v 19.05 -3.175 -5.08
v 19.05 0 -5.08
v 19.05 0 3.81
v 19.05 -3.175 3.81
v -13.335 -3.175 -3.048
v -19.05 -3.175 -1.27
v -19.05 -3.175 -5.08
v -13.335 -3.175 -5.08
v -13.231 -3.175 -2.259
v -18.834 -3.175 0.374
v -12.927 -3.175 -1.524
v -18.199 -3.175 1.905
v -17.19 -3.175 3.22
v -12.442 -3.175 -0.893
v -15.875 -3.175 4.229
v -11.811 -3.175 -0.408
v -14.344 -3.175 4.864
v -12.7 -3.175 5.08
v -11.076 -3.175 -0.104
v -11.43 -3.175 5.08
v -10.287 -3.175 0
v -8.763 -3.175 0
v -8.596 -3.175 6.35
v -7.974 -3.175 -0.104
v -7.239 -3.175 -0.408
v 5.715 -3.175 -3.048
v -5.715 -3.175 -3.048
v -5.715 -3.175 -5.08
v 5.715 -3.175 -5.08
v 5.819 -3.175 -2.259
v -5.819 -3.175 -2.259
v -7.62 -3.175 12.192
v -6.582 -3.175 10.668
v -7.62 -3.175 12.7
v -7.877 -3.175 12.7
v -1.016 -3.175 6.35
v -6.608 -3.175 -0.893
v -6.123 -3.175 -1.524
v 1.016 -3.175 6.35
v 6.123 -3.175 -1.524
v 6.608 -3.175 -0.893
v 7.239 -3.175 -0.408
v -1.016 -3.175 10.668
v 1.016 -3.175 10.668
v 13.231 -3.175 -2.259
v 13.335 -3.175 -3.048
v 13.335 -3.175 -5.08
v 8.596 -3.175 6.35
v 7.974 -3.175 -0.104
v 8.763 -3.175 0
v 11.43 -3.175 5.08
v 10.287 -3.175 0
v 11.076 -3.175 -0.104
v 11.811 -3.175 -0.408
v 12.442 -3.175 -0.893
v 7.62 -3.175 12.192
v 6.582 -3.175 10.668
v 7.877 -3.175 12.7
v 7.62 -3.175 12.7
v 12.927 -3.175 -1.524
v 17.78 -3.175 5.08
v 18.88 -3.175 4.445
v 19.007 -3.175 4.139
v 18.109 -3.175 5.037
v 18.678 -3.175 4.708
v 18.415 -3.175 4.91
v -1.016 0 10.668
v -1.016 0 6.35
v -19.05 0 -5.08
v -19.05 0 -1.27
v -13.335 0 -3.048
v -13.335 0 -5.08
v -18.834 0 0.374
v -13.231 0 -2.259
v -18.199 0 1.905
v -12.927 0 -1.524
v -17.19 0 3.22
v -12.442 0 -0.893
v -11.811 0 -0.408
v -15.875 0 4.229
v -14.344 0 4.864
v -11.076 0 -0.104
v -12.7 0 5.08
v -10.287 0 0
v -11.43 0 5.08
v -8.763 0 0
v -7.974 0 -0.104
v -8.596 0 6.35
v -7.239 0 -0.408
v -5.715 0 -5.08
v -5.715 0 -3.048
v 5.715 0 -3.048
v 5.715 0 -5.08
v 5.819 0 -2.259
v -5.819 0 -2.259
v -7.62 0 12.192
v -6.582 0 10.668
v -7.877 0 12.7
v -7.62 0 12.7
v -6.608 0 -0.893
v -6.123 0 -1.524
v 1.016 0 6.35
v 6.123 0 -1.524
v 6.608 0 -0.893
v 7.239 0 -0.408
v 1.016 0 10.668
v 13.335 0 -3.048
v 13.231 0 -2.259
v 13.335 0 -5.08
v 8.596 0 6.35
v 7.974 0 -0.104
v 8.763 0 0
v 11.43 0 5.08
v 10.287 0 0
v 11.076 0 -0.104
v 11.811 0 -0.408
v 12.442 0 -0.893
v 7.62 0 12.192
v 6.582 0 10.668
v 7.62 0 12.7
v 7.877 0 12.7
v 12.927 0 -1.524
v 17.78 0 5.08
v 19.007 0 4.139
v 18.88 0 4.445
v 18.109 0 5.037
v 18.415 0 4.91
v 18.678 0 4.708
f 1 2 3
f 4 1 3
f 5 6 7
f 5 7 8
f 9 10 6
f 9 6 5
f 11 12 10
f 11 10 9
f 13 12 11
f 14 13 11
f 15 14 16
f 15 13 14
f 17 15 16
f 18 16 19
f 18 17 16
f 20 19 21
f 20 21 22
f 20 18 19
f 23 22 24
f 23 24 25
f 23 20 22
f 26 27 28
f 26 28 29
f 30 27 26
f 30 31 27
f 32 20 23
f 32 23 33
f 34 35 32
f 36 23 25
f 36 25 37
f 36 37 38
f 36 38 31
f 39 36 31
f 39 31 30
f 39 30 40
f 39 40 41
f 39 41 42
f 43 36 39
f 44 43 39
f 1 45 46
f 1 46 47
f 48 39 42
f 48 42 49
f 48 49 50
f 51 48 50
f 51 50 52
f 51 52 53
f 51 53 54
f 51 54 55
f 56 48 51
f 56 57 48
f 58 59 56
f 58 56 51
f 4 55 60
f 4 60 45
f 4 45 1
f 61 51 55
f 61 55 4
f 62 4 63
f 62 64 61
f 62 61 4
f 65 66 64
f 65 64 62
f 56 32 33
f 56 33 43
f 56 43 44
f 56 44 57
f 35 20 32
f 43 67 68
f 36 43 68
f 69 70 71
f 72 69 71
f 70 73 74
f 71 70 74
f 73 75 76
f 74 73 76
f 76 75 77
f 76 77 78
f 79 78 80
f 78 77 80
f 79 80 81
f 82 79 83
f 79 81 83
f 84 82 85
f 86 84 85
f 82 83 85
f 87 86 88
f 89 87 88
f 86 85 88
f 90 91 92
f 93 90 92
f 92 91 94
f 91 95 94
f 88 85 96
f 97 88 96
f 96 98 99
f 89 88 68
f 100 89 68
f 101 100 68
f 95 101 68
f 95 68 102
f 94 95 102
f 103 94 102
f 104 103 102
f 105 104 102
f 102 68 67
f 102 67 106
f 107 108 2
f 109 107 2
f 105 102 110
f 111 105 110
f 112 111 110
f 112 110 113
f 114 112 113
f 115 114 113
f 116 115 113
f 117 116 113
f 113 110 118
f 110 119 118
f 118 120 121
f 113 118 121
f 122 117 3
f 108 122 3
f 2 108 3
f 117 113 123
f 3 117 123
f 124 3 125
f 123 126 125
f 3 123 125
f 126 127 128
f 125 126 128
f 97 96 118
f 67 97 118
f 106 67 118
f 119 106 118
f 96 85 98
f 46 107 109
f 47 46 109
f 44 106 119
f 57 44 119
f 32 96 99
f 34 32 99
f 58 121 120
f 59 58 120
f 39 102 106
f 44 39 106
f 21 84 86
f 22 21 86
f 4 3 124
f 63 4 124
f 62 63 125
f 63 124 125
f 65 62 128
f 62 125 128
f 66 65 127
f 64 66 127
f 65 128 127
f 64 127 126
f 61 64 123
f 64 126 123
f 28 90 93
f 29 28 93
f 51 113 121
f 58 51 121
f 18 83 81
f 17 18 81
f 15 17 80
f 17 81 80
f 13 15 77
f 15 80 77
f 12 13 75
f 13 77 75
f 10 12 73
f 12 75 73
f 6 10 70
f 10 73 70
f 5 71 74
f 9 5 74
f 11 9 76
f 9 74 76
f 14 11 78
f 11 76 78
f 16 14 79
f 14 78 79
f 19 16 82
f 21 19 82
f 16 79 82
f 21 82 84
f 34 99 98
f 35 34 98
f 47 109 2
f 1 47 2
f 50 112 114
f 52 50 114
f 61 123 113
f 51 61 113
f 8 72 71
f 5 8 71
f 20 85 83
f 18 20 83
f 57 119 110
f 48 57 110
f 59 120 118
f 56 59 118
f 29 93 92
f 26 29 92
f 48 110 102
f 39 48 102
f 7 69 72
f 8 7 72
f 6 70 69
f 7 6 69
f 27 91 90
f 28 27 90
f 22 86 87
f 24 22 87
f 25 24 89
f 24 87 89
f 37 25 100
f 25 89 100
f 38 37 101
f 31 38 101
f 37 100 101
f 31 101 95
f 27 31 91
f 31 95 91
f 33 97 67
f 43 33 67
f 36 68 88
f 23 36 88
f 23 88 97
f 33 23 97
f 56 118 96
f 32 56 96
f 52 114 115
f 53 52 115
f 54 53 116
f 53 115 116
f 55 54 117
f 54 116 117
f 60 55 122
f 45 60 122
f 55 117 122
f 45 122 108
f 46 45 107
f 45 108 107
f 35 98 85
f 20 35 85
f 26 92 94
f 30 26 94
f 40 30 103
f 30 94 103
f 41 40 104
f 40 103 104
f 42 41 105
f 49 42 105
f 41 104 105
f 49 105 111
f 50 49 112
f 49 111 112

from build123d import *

# Parameters (mm, degrees)
F1_DEPTH = 3.175


with BuildPart() as f1:
    # F0 (on Front) → F1 (new body)
    with BuildSketch(Plane.XZ):
        with BuildLine():
            ThreePointArc((19.05, 3.81), (18.6780256121, 4.7080256121), (17.78, 5.08))
            Line((17.78, 5.08), (11.43, 5.08))
            Line((11.43, 5.08), (-11.43, 5.08))
            Line((-11.43, 5.08), (-12.7, 5.08))
            ThreePointArc((-12.7, 5.08), (-17.1901280605, 3.2201280605), (-19.05, -1.27))
            Line((-19.05, -1.27), (-19.05, -5.08))
            Line((-19.05, -5.08), (-13.335, -5.08))
            Line((-13.335, -5.08), (-13.335, -3.048))
            ThreePointArc((-13.335, -3.048), (-12.4422614691, -0.8927385309), (-10.287, 0))
            Line((-10.287, 0), (-8.763, 0))
            ThreePointArc((-8.763, 0), (-6.6077385309, -0.8927385309), (-5.715, -3.048))
            Line((-5.715, -3.048), (-5.715, -5.08))
            Line((-5.715, -5.08), (5.715, -5.08))
            Line((5.715, -5.08), (5.715, -3.048))
            ThreePointArc((5.715, -3.048), (6.6077385309, -0.8927385309), (8.763, 0))
            Line((8.763, 0), (10.287, 0))
            ThreePointArc((10.287, 0), (12.4422614691, -0.8927385309), (13.335, -3.048))
            Line((13.335, -3.048), (13.335, -5.08))
            Line((13.335, -5.08), (19.05, -5.08))
            Line((19.05, -5.08), (19.05, 3.81))
        make_face()
        Polygon((-11.43, 5.08), (11.43, 5.08), (7.8767356449, 12.7), (7.62, 12.7), (7.62, 12.192), (0, 12.192), (-7.62, 12.192), (-7.62, 12.7), (-7.8767356449, 12.7), align=None)
        Polygon((-1.016, 6.35), (-8.5957253428, 6.35), (-6.5822088749, 10.668), (-1.016, 10.668), align=None, mode=Mode.SUBTRACT)
        Polygon((8.5957253428, 6.35), (1.016, 6.35), (1.016, 10.668), (6.5822088749, 10.668), align=None, mode=Mode.SUBTRACT)
    extrude(amount=F1_DEPTH)


solid = f1.part
